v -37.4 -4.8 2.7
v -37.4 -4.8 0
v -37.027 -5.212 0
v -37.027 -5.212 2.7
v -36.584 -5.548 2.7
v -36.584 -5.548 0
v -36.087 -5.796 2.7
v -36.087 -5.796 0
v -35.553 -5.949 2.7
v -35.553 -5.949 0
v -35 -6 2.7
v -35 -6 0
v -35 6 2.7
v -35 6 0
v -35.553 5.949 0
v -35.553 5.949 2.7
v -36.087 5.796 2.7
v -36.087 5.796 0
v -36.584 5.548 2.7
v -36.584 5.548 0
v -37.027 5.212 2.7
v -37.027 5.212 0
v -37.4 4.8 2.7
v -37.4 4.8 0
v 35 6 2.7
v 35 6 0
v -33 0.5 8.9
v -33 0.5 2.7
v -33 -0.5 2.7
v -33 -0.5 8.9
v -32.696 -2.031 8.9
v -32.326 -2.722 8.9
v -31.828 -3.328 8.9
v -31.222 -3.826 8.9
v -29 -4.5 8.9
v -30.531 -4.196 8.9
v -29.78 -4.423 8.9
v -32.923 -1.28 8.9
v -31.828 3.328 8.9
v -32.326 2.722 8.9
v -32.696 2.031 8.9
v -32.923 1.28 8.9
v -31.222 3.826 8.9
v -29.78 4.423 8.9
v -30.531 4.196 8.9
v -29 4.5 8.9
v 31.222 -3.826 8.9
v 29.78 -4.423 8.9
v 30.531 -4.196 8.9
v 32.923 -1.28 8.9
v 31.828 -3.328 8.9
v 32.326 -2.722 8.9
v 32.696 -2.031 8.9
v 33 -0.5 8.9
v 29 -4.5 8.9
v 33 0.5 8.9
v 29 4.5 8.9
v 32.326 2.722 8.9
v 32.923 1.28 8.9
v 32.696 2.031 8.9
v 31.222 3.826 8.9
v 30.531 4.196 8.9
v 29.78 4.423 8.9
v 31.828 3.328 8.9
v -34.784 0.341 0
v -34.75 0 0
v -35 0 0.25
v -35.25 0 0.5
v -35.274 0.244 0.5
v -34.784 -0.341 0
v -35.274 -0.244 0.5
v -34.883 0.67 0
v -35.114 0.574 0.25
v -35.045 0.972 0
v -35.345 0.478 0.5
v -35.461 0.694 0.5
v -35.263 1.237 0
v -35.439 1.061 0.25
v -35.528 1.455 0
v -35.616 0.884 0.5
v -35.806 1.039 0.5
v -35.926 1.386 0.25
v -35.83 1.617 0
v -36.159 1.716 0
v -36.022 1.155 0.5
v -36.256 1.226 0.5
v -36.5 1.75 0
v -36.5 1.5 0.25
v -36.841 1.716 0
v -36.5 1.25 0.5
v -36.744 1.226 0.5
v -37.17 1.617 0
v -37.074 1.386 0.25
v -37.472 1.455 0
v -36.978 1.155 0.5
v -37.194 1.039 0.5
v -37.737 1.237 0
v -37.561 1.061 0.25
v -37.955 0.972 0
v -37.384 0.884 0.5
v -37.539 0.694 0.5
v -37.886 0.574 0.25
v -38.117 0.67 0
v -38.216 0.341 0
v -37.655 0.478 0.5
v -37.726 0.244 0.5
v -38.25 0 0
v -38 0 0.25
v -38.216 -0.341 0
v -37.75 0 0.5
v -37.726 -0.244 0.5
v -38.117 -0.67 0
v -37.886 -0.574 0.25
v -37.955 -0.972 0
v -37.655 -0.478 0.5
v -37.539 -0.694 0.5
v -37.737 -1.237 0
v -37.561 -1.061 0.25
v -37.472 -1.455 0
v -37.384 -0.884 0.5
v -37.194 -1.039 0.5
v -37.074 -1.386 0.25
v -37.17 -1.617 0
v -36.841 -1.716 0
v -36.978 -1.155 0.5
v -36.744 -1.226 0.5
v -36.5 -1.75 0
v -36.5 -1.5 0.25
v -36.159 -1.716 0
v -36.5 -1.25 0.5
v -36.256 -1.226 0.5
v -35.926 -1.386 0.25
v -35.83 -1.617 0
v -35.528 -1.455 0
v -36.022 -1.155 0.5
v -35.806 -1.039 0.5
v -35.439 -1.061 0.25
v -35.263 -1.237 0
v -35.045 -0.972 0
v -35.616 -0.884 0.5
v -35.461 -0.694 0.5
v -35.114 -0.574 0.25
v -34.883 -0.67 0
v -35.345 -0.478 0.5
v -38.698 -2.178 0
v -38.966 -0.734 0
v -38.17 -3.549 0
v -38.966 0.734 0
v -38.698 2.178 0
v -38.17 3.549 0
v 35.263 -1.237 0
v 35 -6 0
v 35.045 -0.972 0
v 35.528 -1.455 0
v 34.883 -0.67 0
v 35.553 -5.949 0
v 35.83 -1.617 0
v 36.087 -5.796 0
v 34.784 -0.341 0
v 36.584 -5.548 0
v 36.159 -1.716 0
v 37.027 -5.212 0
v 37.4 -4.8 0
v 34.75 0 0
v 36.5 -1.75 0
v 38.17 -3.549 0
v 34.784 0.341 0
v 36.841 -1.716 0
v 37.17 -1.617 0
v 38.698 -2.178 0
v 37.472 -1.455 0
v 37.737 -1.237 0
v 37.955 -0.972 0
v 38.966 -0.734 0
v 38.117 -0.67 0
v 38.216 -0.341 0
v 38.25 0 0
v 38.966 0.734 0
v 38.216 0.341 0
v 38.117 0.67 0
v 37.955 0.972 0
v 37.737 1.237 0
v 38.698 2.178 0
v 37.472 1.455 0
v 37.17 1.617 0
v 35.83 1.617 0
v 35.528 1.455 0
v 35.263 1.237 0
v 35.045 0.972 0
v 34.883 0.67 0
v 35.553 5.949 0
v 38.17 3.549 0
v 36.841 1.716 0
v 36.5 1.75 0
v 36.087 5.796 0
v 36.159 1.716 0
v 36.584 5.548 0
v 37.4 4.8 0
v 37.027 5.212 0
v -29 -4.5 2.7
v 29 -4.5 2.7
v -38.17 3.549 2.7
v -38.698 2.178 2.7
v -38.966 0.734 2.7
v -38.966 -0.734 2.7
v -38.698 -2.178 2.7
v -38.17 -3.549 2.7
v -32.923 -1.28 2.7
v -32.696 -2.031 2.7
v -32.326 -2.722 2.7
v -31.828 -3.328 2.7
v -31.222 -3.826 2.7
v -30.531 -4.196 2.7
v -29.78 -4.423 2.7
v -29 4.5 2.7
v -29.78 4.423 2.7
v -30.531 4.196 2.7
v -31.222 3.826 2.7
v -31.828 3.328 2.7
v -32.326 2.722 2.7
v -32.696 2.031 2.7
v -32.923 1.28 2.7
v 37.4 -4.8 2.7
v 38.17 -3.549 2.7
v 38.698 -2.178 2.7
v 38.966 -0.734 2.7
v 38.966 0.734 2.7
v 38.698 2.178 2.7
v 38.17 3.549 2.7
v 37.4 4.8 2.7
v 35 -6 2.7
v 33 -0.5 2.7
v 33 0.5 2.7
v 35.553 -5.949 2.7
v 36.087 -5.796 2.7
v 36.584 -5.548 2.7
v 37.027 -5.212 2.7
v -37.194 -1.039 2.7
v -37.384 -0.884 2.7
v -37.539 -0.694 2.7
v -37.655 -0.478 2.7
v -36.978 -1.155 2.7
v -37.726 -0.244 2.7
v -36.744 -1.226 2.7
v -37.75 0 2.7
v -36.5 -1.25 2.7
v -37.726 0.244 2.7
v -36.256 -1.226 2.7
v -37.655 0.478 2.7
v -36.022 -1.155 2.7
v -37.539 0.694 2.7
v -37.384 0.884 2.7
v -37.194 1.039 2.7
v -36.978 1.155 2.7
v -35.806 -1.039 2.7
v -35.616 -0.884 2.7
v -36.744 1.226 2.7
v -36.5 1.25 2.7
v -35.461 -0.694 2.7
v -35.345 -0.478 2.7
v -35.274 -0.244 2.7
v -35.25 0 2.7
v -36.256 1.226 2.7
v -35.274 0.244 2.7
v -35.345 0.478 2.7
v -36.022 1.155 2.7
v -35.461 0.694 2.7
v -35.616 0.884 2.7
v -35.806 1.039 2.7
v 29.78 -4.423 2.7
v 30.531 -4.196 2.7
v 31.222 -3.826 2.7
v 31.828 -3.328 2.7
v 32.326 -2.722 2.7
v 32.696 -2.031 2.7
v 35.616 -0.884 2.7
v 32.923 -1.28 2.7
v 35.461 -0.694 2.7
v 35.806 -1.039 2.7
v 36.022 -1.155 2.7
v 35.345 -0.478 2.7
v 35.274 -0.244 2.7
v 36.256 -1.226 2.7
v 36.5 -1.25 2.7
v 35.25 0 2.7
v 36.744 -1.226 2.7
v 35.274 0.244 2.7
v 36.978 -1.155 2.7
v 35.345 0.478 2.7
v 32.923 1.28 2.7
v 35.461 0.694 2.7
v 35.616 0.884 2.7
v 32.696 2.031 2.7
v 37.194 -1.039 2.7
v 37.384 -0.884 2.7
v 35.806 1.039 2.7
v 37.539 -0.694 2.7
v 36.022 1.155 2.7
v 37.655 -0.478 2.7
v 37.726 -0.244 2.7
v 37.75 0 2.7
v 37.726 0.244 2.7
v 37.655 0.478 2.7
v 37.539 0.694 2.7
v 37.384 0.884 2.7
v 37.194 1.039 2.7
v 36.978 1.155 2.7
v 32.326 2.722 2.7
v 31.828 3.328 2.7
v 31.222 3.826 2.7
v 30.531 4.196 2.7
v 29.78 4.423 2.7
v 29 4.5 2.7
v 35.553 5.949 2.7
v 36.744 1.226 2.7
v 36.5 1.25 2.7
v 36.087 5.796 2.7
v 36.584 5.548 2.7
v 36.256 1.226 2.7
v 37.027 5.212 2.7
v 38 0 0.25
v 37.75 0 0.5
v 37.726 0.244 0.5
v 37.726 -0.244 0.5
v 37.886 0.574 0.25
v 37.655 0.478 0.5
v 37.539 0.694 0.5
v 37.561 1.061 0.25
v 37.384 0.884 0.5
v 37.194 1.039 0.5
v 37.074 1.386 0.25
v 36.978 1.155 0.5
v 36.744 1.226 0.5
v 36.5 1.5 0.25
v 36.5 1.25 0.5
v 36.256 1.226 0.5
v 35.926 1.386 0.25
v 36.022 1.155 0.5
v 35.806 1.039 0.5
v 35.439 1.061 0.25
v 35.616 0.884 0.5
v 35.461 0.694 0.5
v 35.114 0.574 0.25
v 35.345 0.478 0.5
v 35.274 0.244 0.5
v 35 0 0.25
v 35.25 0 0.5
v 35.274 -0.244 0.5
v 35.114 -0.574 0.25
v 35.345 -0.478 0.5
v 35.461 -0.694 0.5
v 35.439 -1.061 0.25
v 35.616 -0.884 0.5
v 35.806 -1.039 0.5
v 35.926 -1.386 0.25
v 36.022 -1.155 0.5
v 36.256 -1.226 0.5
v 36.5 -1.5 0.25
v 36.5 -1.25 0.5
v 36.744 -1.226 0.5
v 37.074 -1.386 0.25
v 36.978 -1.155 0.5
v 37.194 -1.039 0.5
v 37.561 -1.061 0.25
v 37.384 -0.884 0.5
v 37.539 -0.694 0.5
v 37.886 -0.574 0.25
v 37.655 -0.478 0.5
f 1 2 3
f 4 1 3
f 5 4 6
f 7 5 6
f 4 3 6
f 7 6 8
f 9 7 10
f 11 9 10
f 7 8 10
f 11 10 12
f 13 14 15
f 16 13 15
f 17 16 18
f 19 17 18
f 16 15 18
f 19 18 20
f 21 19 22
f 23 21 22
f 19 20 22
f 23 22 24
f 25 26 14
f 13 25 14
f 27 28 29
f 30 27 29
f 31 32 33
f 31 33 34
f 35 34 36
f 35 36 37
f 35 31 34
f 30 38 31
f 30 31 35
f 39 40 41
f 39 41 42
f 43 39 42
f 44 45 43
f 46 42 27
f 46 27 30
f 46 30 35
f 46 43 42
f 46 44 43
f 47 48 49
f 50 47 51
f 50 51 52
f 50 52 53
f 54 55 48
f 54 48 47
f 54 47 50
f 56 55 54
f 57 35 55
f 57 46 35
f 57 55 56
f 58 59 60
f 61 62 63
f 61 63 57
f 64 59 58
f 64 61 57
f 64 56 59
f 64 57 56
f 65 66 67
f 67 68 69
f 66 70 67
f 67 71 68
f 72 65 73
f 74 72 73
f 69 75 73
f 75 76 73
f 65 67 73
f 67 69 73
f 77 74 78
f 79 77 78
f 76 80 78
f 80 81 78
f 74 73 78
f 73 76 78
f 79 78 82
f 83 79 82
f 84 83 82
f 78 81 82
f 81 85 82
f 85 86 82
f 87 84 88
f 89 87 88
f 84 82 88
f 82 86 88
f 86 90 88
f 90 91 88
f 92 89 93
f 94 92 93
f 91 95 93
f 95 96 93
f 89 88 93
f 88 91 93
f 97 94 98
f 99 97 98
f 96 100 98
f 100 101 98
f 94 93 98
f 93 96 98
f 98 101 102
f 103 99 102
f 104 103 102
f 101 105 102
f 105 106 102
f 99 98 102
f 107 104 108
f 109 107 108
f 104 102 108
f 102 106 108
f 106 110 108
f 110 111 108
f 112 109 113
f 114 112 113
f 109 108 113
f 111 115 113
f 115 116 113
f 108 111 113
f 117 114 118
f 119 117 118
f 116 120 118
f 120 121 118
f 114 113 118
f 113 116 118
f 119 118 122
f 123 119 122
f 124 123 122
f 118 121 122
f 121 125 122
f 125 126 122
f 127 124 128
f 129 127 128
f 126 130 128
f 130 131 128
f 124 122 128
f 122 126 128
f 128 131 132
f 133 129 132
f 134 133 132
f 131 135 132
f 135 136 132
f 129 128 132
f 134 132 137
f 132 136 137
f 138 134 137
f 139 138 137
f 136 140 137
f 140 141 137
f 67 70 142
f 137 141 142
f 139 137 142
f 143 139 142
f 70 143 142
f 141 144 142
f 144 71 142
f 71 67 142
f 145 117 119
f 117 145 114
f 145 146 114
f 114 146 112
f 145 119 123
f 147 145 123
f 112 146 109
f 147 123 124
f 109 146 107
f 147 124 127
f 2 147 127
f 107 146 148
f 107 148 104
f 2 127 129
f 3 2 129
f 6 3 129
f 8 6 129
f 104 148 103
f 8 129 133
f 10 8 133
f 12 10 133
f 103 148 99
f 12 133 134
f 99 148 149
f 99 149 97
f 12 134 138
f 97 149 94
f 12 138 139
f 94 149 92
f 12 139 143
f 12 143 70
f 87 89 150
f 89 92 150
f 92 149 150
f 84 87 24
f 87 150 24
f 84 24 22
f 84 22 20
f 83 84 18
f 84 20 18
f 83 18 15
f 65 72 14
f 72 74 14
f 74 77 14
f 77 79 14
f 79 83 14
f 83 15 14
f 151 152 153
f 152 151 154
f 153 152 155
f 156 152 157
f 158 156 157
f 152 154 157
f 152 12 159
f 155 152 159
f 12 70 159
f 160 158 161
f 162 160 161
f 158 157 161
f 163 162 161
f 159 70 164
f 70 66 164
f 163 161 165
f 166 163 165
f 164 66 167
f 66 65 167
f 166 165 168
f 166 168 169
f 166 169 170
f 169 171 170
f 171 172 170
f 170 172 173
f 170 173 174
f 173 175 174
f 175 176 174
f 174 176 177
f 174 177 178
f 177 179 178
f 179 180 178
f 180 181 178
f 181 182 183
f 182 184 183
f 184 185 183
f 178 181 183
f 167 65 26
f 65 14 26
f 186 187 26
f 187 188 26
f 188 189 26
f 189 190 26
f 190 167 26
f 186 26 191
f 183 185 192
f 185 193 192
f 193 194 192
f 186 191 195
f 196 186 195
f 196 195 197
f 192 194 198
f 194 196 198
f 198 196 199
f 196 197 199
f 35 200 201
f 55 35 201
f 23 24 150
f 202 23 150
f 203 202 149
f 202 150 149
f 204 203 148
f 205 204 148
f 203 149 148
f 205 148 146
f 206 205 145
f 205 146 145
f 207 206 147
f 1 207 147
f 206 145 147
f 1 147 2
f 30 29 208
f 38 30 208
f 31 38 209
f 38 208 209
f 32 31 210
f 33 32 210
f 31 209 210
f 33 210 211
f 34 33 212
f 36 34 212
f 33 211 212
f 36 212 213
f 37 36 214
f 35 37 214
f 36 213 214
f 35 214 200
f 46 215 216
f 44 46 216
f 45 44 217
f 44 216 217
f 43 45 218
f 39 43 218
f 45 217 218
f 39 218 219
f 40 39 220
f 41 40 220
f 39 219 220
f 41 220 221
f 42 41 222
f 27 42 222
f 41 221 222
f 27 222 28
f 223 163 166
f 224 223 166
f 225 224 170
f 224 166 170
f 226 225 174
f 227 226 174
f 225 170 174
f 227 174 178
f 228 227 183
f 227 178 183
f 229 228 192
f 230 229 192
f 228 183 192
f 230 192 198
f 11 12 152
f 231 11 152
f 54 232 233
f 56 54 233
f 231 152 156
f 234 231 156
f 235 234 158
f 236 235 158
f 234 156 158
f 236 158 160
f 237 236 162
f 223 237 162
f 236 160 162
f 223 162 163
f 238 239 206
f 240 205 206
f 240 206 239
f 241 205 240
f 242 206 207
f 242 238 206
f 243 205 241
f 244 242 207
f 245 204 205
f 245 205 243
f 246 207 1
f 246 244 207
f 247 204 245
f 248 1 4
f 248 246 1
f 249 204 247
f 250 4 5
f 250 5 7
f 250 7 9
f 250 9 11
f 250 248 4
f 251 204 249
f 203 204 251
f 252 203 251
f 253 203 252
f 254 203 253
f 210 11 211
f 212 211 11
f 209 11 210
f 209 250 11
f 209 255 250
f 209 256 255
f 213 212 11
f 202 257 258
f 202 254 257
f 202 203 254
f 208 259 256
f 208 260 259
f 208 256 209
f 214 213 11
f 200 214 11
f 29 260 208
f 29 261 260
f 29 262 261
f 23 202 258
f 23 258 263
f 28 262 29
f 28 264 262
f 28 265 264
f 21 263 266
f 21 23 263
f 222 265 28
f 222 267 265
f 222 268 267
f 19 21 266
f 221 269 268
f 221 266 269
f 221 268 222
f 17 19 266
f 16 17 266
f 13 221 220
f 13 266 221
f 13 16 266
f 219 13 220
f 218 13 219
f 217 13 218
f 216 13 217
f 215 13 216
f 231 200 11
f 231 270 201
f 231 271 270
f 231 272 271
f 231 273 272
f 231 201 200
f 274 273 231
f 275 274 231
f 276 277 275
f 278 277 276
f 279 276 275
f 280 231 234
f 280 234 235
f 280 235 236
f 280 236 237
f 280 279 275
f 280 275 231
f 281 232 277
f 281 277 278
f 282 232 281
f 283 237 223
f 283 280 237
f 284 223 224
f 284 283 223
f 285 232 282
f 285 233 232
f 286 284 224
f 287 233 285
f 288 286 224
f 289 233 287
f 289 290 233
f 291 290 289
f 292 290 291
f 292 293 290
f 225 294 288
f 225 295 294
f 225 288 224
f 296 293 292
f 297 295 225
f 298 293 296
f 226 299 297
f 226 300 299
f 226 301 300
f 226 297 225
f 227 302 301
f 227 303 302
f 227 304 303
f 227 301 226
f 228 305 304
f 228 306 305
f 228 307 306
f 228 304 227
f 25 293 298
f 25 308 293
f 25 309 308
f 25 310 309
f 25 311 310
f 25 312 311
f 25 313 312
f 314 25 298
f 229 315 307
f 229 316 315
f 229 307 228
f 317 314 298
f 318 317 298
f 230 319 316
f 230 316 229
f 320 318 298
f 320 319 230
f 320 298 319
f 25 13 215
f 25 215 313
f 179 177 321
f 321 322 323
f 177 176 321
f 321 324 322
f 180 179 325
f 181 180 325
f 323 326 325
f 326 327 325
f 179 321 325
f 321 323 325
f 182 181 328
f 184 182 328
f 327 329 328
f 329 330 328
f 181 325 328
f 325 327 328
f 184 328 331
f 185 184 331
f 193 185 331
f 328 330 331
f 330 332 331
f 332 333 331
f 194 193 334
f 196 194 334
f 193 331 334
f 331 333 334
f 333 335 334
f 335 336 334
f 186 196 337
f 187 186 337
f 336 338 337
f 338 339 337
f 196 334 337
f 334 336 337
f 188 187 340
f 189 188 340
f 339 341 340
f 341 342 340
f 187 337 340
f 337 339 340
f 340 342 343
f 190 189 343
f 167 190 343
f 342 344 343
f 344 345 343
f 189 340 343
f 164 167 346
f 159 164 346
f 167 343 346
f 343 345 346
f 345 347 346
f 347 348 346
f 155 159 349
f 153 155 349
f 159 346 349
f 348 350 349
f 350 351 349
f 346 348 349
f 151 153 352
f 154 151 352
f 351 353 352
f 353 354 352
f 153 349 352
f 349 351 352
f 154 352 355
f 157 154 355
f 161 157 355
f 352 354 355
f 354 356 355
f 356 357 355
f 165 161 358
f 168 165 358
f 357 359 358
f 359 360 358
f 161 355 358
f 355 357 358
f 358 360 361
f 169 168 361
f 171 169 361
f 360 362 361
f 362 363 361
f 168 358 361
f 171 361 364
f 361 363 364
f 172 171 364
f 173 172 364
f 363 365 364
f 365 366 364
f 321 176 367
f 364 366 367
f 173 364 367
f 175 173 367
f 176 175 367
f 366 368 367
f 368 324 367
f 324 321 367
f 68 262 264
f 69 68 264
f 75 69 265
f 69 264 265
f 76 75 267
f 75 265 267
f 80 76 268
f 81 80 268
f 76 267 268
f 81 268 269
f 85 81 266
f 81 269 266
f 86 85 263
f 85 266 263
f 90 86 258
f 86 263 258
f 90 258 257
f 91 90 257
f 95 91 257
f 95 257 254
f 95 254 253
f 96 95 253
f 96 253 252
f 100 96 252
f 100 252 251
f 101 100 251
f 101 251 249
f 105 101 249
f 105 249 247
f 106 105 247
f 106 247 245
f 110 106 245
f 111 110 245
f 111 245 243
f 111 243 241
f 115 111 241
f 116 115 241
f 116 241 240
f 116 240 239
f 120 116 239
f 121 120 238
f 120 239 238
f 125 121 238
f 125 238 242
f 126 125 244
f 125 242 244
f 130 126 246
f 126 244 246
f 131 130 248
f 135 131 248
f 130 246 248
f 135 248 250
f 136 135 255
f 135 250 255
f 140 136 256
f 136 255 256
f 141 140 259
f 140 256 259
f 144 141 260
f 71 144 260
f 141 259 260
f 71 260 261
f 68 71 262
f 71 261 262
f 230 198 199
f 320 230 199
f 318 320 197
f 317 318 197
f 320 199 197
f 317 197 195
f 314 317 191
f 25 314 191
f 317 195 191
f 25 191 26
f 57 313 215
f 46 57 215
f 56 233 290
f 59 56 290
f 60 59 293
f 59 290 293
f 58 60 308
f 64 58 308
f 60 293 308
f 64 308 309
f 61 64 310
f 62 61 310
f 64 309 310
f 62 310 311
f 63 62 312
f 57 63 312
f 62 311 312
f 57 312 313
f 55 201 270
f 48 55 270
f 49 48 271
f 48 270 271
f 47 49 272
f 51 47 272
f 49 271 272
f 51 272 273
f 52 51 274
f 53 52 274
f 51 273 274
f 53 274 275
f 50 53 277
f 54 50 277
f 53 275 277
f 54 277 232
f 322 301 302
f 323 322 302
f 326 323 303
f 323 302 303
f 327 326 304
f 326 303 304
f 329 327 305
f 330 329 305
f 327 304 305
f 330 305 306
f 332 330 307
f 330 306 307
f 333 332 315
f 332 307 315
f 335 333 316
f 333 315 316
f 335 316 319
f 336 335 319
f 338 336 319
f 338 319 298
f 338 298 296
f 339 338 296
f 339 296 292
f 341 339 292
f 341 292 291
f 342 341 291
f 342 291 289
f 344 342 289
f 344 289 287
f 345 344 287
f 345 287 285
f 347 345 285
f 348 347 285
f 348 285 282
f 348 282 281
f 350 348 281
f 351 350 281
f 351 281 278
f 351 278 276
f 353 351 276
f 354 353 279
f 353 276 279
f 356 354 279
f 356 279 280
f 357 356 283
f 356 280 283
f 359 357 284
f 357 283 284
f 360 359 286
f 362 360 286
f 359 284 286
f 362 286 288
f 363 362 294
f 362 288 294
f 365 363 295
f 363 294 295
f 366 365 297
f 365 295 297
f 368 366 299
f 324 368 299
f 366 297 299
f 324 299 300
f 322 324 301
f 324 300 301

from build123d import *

# Parameters (mm, degrees)
F1_DEPTH = 2.7
F3_DEPTH = 6.2
F4_R     = 1.25
F5_DEPTH = 25
F6_SIZE  = 0.5


with BuildPart() as f1:
    # F0 (on Top) → F1 (new body)
    with BuildSketch(Plane.XY):
        with BuildLine():
            Line((-35, -6), (35, -6))
            ThreePointArc((35, -6), (36.3416407865, -5.683281573), (37.4, -4.8))
            ThreePointArc((37.4, -4.8), (39, 0), (37.4, 4.8))
            ThreePointArc((37.4, 4.8), (36.3416407865, 5.683281573), (35, 6))
            Line((35, 6), (-35, 6))
            ThreePointArc((-35, 6), (-36.3416407865, 5.683281573), (-37.4, 4.8))
            ThreePointArc((-37.4, 4.8), (-39, 0), (-37.4, -4.8))
            ThreePointArc((-37.4, -4.8), (-36.3416407865, -5.683281573), (-35, -6))
        make_face()
    extrude(amount=F1_DEPTH)

    # F2 (on face) → F3 (join)
    with BuildSketch(Plane.XY.offset(2.7)):
        with BuildLine():
            Line((29, 4.5), (-29, 4.5))
            ThreePointArc((-29, 4.5), (-31.8284271247, 3.3284271247), (-33, 0.5))
            Line((-33, 0.5), (-33, -0.5))
            ThreePointArc((-33, -0.5), (-31.8284271247, -3.3284271247), (-29, -4.5))
            Line((-29, -4.5), (29, -4.5))
            ThreePointArc((29, -4.5), (31.8284271247, -3.3284271247), (33, -0.5))
            Line((33, -0.5), (33, 0.5))
            ThreePointArc((33, 0.5), (31.8284271247, 3.3284271247), (29, 4.5))
        make_face()
    extrude(amount=F3_DEPTH)

    # F4 (on face) → F5 (cut)
    with BuildSketch(Plane.XY.offset(2.7)):
        with Locations((-36.5, 0)):
            Circle(F4_R)
        with Locations((36.5, 0)):
            Circle(F4_R)
    extrude(amount=-F5_DEPTH, mode=Mode.SUBTRACT)

    # F6
    f6_edges = [f1.edges().sort_by_distance(p)[0] for p in [
        (-37.75, 0, 0),
        (35.25, 0, 0),
    ]]
    chamfer(f6_edges, length=F6_SIZE)


solid = f1.part
